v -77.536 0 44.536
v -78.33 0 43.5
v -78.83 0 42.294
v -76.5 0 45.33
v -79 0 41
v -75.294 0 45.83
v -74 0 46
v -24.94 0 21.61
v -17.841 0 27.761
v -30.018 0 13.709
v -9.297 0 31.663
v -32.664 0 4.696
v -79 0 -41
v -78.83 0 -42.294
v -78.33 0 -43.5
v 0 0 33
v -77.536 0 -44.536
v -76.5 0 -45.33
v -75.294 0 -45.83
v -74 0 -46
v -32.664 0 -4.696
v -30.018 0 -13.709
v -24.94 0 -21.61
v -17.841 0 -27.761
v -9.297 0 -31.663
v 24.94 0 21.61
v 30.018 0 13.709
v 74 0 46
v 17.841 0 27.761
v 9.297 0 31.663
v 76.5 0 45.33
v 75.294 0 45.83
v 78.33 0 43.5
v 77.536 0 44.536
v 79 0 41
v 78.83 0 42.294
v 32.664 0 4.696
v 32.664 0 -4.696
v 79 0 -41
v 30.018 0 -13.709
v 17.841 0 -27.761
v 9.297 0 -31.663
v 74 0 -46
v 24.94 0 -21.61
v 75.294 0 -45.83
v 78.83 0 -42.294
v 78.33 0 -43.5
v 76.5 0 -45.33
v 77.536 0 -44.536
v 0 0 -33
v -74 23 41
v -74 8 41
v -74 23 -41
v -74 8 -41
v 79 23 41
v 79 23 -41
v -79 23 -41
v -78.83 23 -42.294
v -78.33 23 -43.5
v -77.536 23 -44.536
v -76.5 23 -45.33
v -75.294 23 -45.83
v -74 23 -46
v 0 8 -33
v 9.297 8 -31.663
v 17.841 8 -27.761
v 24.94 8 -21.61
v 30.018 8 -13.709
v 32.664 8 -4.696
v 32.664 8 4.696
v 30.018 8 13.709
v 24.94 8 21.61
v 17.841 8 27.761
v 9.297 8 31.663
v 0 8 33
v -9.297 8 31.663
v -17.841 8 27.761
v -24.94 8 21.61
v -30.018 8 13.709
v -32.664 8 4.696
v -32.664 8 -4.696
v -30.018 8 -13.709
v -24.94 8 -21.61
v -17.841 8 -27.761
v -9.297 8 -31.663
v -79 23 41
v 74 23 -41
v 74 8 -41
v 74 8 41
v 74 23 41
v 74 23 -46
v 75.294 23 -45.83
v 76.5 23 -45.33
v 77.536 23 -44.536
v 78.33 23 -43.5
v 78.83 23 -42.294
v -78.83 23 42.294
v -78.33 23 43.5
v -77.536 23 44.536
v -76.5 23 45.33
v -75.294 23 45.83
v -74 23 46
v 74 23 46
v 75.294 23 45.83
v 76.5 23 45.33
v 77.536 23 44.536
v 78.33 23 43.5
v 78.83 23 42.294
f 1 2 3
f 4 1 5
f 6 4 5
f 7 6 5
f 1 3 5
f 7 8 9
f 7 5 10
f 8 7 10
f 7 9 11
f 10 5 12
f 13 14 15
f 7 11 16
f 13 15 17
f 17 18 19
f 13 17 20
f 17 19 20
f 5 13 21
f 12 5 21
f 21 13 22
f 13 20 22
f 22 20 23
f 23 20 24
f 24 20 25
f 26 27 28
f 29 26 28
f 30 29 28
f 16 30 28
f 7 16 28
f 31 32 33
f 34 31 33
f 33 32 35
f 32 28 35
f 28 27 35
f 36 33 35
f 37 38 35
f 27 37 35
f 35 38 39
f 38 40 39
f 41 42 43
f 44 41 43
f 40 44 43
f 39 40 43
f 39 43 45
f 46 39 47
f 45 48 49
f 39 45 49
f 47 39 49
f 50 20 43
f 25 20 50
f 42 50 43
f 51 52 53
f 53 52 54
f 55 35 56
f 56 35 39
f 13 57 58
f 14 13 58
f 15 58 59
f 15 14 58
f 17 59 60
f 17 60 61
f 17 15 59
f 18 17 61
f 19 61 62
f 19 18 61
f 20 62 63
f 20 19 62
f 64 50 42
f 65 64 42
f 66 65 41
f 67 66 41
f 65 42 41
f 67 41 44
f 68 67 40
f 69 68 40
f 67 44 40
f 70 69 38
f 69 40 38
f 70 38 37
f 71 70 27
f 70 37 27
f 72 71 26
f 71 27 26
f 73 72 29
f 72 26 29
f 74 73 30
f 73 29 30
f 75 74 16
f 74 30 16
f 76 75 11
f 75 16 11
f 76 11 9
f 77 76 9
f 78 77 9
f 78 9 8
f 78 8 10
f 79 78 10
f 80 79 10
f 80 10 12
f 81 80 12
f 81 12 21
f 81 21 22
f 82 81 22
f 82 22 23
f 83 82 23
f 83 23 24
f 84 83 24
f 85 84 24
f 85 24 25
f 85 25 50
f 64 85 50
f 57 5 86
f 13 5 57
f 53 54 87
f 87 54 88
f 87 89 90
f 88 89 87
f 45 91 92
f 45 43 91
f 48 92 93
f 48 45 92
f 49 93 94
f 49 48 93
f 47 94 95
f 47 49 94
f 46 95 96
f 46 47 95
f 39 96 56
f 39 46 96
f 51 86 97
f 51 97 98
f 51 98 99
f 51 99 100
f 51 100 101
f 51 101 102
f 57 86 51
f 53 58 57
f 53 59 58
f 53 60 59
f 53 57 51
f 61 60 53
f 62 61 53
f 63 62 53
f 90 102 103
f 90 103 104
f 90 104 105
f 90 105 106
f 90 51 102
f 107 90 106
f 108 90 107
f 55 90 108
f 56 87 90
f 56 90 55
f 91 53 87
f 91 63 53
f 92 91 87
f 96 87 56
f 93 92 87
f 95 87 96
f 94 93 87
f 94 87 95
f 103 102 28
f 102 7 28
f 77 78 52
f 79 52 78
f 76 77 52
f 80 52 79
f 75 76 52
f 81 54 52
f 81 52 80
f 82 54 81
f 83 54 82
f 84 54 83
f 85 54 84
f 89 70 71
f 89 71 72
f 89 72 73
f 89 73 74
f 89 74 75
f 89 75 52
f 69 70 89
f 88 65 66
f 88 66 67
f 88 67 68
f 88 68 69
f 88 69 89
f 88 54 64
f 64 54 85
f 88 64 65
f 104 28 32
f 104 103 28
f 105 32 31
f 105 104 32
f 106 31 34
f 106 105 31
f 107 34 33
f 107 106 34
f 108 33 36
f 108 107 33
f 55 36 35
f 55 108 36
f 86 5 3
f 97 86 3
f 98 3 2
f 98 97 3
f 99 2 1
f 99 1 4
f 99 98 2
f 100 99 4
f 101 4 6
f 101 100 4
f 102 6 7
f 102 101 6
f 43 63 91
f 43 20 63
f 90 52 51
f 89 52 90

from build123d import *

# Parameters (mm, degrees)
SKETCH1_W           = 158
SKETCH1_H           = 92
BOSS_EXTRUDE1_DEPTH = 8
SKETCH2_W           = 158
SKETCH2_H           = 92
SKETCH2_W_2         = 148
SKETCH2_H_2         = 82
BOSS_EXTRUDE2_DEPTH = 15
SKETCH3_R           = 33
CUT_EXTRUDE1_DEPTH  = 95.265582266
FILLET1_R           = 5
FILLET2_R           = 5


with BuildPart() as part:
    # Sketch1 → Boss-Extrude1 (new body)
    with BuildSketch(Plane(origin=(0, 0, 0), x_dir=(1, 0, 0), z_dir=(0, 1, 0))):
        Rectangle(SKETCH1_W, SKETCH1_H)
    extrude(amount=BOSS_EXTRUDE1_DEPTH)

    # Sketch2 → Boss-Extrude2 (add)
    with BuildSketch(Plane(origin=(0, 8, 0), x_dir=(1, 0, 0), z_dir=(0, 1, 0))):
        Rectangle(SKETCH2_W, SKETCH2_H)
        Rectangle(SKETCH2_W_2, SKETCH2_H_2, mode=Mode.SUBTRACT)
    extrude(amount=BOSS_EXTRUDE2_DEPTH)

    # Sketch3 → Cut-Extrude1 (cut, through all)
    with BuildSketch(Plane.XZ):
        with Locations(Location((0, 0, 0), (0, 0, 270))):
            Circle(SKETCH3_R)
    extrude(amount=-CUT_EXTRUDE1_DEPTH, mode=Mode.SUBTRACT)

    # Fillet1
    fillet1_edges = [part.edges().sort_by_distance(p)[0] for p in [
        (-79, 11.5, 46),
    ]]
    fillet(fillet1_edges, radius=FILLET1_R)

    # Fillet2
    fillet2_edges = [part.edges().sort_by_distance(p)[0] for p in [
        (79, 11.5, 46),
        (-79, 11.5, -46),
        (79, 11.5, -46),
    ]]
    fillet(fillet2_edges, radius=FILLET2_R)


solid = part.part
